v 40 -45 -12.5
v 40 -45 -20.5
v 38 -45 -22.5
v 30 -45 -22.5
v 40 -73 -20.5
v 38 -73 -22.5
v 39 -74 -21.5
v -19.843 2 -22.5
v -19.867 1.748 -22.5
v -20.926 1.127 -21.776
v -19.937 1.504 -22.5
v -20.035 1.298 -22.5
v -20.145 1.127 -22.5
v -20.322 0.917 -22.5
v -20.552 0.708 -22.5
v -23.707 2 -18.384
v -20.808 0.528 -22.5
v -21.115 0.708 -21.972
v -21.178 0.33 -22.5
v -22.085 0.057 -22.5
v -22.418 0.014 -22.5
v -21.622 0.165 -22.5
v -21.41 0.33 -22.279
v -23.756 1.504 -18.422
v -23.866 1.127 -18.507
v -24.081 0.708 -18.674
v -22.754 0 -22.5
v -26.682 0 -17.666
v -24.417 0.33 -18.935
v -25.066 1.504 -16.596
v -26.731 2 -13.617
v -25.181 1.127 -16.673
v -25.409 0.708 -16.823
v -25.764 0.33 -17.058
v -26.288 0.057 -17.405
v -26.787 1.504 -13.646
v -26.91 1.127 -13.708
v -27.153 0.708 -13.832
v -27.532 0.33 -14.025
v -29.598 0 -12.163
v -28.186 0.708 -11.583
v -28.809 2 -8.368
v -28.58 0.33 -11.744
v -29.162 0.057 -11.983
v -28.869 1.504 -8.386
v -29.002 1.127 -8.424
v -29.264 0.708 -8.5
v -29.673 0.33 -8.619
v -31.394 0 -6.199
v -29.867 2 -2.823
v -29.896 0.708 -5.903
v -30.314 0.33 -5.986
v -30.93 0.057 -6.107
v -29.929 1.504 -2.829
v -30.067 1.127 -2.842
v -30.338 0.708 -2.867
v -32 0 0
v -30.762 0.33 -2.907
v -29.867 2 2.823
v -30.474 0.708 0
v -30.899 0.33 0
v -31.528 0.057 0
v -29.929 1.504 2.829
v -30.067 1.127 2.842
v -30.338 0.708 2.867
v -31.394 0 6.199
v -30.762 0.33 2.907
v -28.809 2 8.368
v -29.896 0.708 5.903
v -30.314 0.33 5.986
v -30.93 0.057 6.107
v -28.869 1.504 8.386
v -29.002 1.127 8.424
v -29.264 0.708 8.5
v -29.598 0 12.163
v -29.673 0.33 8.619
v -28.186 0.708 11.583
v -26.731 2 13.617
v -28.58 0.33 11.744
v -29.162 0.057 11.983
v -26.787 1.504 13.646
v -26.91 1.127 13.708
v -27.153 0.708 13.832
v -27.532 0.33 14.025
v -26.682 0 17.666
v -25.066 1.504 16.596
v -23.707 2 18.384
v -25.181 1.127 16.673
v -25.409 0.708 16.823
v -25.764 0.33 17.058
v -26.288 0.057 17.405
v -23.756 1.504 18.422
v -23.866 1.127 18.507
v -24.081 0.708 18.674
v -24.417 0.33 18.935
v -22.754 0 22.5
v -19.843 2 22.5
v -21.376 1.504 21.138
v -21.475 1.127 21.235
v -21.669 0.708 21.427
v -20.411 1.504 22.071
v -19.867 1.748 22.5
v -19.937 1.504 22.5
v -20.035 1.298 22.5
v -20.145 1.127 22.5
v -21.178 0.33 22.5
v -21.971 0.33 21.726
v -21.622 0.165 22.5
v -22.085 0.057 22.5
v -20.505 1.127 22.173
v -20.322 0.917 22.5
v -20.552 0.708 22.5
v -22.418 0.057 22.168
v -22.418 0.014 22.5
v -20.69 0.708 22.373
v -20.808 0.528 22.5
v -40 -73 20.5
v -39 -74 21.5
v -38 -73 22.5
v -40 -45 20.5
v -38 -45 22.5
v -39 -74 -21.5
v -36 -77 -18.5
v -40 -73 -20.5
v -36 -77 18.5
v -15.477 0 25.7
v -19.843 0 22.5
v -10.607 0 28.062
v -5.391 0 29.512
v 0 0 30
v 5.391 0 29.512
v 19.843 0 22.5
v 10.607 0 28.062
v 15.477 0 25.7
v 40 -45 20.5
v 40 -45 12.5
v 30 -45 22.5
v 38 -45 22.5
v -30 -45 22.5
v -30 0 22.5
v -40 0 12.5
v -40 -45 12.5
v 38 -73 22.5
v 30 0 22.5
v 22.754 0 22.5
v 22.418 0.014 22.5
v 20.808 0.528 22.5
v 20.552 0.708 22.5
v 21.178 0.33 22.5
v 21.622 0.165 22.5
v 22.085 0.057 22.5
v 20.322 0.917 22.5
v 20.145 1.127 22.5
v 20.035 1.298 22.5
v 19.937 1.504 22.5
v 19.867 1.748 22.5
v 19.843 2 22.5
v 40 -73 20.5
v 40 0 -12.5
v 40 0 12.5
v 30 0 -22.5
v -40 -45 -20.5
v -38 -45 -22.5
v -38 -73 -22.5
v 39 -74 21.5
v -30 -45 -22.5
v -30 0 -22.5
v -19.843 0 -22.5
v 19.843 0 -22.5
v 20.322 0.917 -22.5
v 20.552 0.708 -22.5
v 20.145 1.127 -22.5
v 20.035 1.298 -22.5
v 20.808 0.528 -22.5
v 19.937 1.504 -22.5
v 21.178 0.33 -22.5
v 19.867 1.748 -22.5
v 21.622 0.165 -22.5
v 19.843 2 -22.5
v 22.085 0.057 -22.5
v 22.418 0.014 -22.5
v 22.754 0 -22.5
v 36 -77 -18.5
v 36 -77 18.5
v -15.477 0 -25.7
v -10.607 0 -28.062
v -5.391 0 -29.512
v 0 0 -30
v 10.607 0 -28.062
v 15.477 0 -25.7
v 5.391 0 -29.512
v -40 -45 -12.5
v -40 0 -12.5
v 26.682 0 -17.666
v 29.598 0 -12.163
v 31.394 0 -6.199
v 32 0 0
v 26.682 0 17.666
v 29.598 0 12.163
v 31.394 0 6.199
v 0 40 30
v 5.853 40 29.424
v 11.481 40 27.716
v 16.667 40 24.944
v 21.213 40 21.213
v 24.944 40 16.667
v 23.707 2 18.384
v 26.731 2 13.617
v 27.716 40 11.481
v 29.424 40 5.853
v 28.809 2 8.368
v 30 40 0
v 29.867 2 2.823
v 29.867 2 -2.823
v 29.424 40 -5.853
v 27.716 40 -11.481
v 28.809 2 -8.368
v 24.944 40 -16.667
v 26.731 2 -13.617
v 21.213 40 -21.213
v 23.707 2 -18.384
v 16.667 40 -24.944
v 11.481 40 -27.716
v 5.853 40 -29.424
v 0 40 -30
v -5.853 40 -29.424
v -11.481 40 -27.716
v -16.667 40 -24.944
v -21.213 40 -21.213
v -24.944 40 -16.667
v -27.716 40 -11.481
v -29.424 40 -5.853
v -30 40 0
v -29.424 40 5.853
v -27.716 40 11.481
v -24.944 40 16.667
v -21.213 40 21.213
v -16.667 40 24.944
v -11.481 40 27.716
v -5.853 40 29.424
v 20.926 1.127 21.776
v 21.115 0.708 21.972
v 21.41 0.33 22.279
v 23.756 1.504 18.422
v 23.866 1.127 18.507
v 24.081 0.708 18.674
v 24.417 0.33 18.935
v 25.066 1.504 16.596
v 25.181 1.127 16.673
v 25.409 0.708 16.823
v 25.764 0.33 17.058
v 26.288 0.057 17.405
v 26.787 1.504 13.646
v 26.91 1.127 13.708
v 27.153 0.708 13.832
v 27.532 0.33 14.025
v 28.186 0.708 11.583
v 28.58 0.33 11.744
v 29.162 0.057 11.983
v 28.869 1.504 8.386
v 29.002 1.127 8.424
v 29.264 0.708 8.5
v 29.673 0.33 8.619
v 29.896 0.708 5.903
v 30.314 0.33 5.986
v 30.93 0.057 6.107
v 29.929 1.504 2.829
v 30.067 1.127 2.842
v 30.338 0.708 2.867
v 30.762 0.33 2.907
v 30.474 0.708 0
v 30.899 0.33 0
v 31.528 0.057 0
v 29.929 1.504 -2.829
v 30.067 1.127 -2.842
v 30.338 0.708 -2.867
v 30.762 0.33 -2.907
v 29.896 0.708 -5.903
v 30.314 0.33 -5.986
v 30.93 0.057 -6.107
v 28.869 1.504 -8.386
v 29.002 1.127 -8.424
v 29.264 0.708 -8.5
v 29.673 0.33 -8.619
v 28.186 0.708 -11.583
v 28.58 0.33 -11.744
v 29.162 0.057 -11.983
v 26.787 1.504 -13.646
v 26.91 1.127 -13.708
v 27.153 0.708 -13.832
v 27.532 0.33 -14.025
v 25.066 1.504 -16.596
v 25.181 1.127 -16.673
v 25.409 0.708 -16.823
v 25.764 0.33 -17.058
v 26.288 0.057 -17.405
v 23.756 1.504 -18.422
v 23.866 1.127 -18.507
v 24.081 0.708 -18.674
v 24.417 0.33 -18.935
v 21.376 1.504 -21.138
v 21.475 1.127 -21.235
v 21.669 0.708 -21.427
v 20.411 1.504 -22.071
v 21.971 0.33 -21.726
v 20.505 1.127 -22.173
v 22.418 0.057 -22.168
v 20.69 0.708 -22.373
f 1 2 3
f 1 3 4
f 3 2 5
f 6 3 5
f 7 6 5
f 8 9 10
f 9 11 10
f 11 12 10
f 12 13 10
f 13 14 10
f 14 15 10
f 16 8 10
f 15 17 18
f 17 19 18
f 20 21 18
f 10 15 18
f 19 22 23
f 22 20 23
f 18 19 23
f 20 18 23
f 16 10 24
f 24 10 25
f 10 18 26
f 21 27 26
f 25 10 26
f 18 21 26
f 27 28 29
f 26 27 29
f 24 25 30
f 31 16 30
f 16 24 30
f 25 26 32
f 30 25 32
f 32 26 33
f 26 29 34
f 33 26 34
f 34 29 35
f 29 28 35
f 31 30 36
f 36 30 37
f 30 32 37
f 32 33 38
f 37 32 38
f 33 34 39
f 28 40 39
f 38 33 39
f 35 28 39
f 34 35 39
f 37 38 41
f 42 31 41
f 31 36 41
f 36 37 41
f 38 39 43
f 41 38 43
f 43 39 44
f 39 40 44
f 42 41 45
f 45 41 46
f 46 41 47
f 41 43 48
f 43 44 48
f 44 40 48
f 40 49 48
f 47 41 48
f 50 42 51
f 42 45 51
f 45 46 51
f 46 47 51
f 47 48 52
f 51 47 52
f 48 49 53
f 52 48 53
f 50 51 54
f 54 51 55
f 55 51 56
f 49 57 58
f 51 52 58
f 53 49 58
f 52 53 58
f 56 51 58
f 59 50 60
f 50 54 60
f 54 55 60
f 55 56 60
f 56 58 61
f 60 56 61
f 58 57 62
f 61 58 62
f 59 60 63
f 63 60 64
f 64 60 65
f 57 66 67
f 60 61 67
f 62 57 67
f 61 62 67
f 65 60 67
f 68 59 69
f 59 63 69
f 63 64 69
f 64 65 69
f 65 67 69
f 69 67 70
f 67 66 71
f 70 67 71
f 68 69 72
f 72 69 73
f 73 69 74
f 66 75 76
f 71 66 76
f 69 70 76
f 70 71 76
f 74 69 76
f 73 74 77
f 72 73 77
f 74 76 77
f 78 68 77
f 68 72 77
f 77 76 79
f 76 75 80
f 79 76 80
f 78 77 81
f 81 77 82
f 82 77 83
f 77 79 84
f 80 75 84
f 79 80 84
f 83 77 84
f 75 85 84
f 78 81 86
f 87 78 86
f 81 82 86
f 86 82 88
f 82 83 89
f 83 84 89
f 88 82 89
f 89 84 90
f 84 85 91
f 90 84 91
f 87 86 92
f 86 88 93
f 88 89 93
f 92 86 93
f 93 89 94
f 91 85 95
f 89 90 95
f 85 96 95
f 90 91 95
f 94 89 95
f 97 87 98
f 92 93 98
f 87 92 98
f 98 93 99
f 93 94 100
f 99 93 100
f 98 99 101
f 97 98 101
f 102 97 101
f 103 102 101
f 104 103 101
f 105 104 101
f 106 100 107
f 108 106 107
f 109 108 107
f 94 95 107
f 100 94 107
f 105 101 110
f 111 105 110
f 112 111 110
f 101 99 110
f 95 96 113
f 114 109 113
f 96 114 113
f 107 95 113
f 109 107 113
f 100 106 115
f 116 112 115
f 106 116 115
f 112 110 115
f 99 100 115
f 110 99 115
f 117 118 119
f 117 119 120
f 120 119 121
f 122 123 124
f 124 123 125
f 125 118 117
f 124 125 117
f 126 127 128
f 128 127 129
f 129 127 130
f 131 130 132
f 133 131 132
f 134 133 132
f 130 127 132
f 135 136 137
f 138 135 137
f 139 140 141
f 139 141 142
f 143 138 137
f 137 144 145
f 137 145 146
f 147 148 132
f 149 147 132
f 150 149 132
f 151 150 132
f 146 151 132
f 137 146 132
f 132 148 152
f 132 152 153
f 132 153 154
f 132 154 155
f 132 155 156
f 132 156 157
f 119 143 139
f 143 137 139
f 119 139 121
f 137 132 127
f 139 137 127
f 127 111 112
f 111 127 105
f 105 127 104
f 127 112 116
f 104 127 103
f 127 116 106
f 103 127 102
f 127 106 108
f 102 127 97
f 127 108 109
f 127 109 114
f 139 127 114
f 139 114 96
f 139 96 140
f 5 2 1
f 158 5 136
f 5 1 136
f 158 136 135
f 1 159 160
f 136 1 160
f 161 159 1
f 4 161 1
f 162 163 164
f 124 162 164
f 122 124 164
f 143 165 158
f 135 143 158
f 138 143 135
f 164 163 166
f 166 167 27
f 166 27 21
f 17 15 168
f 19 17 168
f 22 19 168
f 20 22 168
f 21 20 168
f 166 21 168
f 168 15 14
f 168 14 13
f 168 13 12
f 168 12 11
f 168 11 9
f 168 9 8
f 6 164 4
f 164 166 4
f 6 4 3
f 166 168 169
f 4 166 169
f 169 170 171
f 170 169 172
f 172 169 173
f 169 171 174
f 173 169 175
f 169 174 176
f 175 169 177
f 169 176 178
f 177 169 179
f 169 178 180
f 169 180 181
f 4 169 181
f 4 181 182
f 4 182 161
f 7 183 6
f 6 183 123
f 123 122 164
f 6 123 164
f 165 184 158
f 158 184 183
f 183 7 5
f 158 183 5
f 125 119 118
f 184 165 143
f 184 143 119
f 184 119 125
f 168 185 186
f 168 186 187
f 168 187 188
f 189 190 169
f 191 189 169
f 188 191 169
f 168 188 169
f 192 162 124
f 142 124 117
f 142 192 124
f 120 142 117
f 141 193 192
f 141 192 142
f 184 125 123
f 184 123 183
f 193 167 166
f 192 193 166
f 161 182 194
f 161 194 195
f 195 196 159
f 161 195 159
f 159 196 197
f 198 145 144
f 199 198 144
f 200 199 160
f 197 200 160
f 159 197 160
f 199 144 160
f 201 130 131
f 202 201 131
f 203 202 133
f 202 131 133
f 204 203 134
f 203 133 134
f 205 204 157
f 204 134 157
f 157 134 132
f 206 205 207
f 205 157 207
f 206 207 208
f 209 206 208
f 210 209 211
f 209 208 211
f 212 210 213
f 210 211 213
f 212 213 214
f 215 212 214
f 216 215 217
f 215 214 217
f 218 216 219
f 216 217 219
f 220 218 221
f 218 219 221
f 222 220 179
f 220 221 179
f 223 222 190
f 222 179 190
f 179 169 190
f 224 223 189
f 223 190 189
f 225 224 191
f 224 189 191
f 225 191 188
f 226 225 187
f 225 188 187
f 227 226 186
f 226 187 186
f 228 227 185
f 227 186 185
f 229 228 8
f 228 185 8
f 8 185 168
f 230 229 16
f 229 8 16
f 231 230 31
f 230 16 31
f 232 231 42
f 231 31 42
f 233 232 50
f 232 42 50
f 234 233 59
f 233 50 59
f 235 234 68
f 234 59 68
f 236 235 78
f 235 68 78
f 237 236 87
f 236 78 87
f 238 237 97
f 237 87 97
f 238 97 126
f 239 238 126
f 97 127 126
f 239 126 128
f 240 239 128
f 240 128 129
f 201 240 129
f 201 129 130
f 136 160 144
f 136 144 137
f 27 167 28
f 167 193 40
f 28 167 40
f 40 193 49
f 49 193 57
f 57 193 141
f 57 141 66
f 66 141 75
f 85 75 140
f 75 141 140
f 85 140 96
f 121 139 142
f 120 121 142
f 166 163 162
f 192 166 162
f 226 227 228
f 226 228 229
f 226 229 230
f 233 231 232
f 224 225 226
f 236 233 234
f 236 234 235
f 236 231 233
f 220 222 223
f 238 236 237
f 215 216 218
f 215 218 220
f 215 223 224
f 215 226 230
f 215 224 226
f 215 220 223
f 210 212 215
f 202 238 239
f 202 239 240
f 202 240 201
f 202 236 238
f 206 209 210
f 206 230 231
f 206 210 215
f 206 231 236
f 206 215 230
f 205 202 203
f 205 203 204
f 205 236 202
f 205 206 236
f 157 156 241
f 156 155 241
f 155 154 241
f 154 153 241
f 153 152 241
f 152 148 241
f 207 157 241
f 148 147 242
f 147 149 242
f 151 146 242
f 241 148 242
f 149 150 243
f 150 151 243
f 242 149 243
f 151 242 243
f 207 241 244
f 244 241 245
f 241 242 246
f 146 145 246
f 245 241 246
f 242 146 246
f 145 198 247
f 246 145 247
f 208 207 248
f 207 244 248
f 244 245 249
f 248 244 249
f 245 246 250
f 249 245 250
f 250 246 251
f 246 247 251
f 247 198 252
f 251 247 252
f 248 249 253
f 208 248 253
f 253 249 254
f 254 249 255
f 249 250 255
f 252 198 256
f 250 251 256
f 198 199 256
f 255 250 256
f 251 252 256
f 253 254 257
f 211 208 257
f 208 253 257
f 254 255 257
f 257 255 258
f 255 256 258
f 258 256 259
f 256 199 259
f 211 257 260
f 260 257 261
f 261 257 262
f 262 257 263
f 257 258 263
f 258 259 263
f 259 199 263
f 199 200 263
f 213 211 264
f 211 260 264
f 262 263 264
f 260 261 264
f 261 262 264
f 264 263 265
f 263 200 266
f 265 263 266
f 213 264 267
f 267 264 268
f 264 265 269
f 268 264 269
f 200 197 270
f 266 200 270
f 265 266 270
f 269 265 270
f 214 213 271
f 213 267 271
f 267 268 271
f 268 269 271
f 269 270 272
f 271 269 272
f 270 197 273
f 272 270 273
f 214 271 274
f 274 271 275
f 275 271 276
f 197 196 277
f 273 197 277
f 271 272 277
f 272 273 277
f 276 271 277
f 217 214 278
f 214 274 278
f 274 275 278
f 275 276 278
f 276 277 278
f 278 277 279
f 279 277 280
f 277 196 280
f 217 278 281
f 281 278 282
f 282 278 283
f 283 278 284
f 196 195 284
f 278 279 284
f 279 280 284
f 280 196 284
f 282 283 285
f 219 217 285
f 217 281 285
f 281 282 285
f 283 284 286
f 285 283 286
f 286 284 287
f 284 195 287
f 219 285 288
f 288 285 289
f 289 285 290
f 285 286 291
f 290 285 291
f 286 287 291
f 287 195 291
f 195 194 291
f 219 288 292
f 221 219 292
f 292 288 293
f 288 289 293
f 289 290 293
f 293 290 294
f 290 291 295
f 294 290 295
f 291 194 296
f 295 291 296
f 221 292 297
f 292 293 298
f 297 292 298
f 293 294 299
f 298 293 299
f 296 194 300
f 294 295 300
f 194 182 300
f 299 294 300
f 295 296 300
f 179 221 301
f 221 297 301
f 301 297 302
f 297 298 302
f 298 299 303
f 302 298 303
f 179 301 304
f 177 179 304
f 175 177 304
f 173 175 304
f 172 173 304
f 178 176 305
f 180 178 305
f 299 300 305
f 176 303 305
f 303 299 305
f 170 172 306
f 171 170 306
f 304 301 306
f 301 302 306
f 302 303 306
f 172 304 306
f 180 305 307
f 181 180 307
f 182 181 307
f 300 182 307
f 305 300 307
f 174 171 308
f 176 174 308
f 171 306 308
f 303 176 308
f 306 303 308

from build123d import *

# Parameters (mm, degrees)
SKETCH1_R           = 30
BOSS_EXTRUDE1_DEPTH = 40
SKETCH2_W           = 80
SKETCH2_H           = 45
BOSS_EXTRUDE2_DEPTH = 45
CHAMFER1_SIZE       = 10
SKETCH4_W           = 80
SKETCH4_H           = 45
BOSS_EXTRUDE3_DEPTH = 2
SKETCH5_W           = 80
SKETCH5_H           = 45
BOSS_EXTRUDE4_DEPTH = 30
CHAMFER2_SIZE       = 2
CHAMFER3_SIZE       = 4
FILLET1_R           = 2


with BuildPart() as part:
    # Sketch1 → Boss-Extrude1 (new body)
    with BuildSketch(Plane(origin=(0, 0, 0), x_dir=(1, 0, 0), z_dir=(0, 1, 0))):
        with Locations(Location((0, 0, 0), (0, 0, 270))):
            Circle(SKETCH1_R)
    extrude(amount=BOSS_EXTRUDE1_DEPTH)

    # Sketch2 → Boss-Extrude2 (add)
    with BuildSketch(Plane.XZ):
        Rectangle(SKETCH2_W, SKETCH2_H)
    extrude(amount=BOSS_EXTRUDE2_DEPTH)

    # Chamfer1
    chamfer1_edges = [part.edges().sort_by_distance(p)[0] for p in [
        (40, -22.5, 22.5),
        (-40, -22.5, 22.5),
        (-40, -22.5, -22.5),
        (40, -22.5, -22.5),
    ]]
    chamfer(chamfer1_edges, length=CHAMFER1_SIZE)

    # Sketch4 → Boss-Extrude3 (add)
    with BuildSketch(Plane(origin=(0, -45, 0), x_dir=(-1, 0, 0), z_dir=(0, -1, 0))):
        Rectangle(SKETCH4_W, SKETCH4_H)
    extrude(amount=BOSS_EXTRUDE3_DEPTH)

    # Sketch5 → Boss-Extrude4 (add)
    with BuildSketch(Plane.XZ.offset(47)):
        Rectangle(SKETCH5_W, SKETCH5_H)
    extrude(amount=BOSS_EXTRUDE4_DEPTH)

    # Chamfer2
    chamfer2_edges = [part.edges().sort_by_distance(p)[0] for p in [
        (40, -61, -22.5),
        (40, -61, 22.5),
        (-40, -61, 22.5),
        (-40, -61, -22.5),
    ]]
    chamfer(chamfer2_edges, length=CHAMFER2_SIZE)

    # Chamfer3
    # the kernel refuses this chamfer: 4 mm, written as the material it takes off along each edge
    with BuildSketch(Plane(origin=(48.286731952, -77, 22.5), x_dir=(0, 0.9996219169112968, 0.02749587661058651), z_dir=(-1, 0, 0))) as chamfer3_piece_1:
        Polygon((CHAMFER3_SIZE * 0.999621916911, CHAMFER3_SIZE * 0.0274958766106), (-CHAMFER3_SIZE * 0.0274958766106, CHAMFER3_SIZE * 0.999621916911), (0, 0), align=None)
    extrude(amount=96.573463904, mode=Mode.SUBTRACT)
    with BuildSketch(Plane(origin=(-40, -77, 30.786731952), x_dir=(0.9996219169112968, -0.027495876610585647, 0), z_dir=(0, 0, -1)), Plane(origin=(40, -77, -30.786731952), x_dir=(-0.9996219169112968, -0.027495876610585647, 0), z_dir=(0, 0, 1))) as chamfer3_piece_2:
        Polygon((CHAMFER3_SIZE * 0.999621916911, -CHAMFER3_SIZE * 0.0274958766106), (-CHAMFER3_SIZE * 0.0274958766106, -CHAMFER3_SIZE * 0.999621916911), (0, 0), align=None)
    extrude(amount=61.573463904, mode=Mode.SUBTRACT)
    with BuildSketch(Plane(origin=(-48.286731952, -77, -22.5), x_dir=(0, -0.027495876610585623, 0.9996219169112968), z_dir=(1, 0, 0))) as chamfer3_piece_3:
        Polygon((CHAMFER3_SIZE * 0.999621916911, -CHAMFER3_SIZE * 0.0274958766106), (-CHAMFER3_SIZE * 0.0274958766106, -CHAMFER3_SIZE * 0.999621916911), (0, 0), align=None)
    extrude(amount=96.573463904, mode=Mode.SUBTRACT)

    # Fillet1
    # the kernel refuses this fillet: 2 mm, written as the material it adds along each edge
    with BuildSketch(Plane(origin=(0, 0, 0), x_dir=(0.527784032478236, 0, 0.8493786052526943), z_dir=(-0.8493786052526943, 0, 0.527784032478236))) as fillet1_piece_1_section:
        with BuildLine():
            CenterArc((30 + FILLET1_R, FILLET1_R), FILLET1_R, 180, 90)
            Line((30, FILLET1_R), (30, 0))
            Line((30, 0), (30 + FILLET1_R, 0))
        make_face()
    fillet1_piece_1 = revolve(axis=Axis((0, 0, 0), (0, 1, 0)), revolution_arc=116.288294518, mode=Mode.PRIVATE)
    fillet1_piece_1 = split(fillet1_piece_1, bisect_by=Plane(origin=(30.560923214, 0.560923214, 22.5), z_dir=(0, 0, -1)), keep=Keep.TOP, mode=Mode.PRIVATE)
    fillet1_piece_1 = split(fillet1_piece_1, bisect_by=Plane(origin=(30.560923214, 0.560923214, -22.5), z_dir=(0, 0, 1)), keep=Keep.TOP, mode=Mode.PRIVATE)
    add(fillet1_piece_1)
    with BuildSketch(Plane(origin=(0, 0, 0), x_dir=(-0.527784032478229, 0, -0.8493786052526988), z_dir=(0.8493786052526988, 0, -0.527784032478229))) as fillet1_piece_2_section:
        with BuildLine():
            CenterArc((30 + FILLET1_R, FILLET1_R), FILLET1_R, 180, 90)
            Line((30, FILLET1_R), (30, 0))
            Line((30, 0), (30 + FILLET1_R, 0))
        make_face()
    fillet1_piece_2 = revolve(axis=Axis((0, 0, 0), (0, 1, 0)), revolution_arc=116.288294518, mode=Mode.PRIVATE)
    fillet1_piece_2 = split(fillet1_piece_2, bisect_by=Plane(origin=(-30.560923214, 0.560923214, 22.5), z_dir=(0, 0, -1)), keep=Keep.TOP, mode=Mode.PRIVATE)
    fillet1_piece_2 = split(fillet1_piece_2, bisect_by=Plane(origin=(-30.560923214, 0.560923214, -22.5), z_dir=(0, 0, 1)), keep=Keep.TOP, mode=Mode.PRIVATE)
    add(fillet1_piece_2)


solid = part.part
